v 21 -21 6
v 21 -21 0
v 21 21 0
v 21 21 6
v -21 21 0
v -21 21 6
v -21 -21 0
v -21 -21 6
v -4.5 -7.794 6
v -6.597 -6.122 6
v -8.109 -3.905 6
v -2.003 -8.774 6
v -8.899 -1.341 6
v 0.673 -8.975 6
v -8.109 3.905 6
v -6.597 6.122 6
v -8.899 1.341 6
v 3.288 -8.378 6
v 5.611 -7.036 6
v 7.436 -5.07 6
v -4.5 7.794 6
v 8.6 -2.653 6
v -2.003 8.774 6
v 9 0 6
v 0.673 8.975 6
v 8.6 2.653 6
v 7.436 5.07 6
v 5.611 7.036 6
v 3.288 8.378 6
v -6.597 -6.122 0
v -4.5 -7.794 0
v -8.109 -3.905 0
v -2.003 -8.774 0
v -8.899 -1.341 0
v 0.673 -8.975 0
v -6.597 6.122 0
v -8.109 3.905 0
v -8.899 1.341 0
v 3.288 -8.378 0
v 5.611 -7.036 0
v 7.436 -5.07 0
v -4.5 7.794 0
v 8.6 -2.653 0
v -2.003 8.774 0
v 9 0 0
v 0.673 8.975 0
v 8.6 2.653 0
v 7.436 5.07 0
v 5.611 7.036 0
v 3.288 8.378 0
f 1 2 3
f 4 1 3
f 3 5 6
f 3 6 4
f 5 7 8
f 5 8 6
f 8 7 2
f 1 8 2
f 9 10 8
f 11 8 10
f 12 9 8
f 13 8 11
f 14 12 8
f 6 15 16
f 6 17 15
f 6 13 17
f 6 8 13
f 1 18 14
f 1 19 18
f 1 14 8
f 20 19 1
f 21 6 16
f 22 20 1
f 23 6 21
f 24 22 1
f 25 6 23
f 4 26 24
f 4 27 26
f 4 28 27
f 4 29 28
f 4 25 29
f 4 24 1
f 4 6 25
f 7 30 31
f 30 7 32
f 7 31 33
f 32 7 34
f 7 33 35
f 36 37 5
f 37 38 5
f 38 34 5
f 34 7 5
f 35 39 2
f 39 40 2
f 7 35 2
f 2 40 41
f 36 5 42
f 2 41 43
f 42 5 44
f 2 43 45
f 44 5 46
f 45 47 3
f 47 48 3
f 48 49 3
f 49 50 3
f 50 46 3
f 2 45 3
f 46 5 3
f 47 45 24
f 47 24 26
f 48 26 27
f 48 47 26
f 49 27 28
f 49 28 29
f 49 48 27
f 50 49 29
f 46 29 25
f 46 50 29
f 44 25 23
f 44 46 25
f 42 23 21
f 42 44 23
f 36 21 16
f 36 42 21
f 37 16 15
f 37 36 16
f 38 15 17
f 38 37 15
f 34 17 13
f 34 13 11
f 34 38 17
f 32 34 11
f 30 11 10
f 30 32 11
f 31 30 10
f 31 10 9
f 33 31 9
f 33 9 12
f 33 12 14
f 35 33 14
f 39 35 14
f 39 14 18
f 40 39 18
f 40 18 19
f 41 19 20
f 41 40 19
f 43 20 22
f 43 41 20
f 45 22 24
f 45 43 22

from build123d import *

# Parameters (mm, degrees)
SKETCH_1_W      = 70
SKETCH_1_H      = 70
SKETCH_1_R      = 15
EXTRUDE_1_DEPTH = 10
SCALE_1_SCALE   = 0.6


with BuildPart() as part:
    # 草图1 → 凸台-拉伸1 (new body)
    with BuildSketch(Plane.XY):
        Rectangle(SKETCH_1_W, SKETCH_1_H)
        Circle(SKETCH_1_R, mode=Mode.SUBTRACT)
    extrude(amount=EXTRUDE_1_DEPTH)


with BuildPart() as part_1:
    # 缩放比例1: scaled about (0, 0, 0)
    add(part.part.scale(SCALE_1_SCALE))


solid = part_1.part
